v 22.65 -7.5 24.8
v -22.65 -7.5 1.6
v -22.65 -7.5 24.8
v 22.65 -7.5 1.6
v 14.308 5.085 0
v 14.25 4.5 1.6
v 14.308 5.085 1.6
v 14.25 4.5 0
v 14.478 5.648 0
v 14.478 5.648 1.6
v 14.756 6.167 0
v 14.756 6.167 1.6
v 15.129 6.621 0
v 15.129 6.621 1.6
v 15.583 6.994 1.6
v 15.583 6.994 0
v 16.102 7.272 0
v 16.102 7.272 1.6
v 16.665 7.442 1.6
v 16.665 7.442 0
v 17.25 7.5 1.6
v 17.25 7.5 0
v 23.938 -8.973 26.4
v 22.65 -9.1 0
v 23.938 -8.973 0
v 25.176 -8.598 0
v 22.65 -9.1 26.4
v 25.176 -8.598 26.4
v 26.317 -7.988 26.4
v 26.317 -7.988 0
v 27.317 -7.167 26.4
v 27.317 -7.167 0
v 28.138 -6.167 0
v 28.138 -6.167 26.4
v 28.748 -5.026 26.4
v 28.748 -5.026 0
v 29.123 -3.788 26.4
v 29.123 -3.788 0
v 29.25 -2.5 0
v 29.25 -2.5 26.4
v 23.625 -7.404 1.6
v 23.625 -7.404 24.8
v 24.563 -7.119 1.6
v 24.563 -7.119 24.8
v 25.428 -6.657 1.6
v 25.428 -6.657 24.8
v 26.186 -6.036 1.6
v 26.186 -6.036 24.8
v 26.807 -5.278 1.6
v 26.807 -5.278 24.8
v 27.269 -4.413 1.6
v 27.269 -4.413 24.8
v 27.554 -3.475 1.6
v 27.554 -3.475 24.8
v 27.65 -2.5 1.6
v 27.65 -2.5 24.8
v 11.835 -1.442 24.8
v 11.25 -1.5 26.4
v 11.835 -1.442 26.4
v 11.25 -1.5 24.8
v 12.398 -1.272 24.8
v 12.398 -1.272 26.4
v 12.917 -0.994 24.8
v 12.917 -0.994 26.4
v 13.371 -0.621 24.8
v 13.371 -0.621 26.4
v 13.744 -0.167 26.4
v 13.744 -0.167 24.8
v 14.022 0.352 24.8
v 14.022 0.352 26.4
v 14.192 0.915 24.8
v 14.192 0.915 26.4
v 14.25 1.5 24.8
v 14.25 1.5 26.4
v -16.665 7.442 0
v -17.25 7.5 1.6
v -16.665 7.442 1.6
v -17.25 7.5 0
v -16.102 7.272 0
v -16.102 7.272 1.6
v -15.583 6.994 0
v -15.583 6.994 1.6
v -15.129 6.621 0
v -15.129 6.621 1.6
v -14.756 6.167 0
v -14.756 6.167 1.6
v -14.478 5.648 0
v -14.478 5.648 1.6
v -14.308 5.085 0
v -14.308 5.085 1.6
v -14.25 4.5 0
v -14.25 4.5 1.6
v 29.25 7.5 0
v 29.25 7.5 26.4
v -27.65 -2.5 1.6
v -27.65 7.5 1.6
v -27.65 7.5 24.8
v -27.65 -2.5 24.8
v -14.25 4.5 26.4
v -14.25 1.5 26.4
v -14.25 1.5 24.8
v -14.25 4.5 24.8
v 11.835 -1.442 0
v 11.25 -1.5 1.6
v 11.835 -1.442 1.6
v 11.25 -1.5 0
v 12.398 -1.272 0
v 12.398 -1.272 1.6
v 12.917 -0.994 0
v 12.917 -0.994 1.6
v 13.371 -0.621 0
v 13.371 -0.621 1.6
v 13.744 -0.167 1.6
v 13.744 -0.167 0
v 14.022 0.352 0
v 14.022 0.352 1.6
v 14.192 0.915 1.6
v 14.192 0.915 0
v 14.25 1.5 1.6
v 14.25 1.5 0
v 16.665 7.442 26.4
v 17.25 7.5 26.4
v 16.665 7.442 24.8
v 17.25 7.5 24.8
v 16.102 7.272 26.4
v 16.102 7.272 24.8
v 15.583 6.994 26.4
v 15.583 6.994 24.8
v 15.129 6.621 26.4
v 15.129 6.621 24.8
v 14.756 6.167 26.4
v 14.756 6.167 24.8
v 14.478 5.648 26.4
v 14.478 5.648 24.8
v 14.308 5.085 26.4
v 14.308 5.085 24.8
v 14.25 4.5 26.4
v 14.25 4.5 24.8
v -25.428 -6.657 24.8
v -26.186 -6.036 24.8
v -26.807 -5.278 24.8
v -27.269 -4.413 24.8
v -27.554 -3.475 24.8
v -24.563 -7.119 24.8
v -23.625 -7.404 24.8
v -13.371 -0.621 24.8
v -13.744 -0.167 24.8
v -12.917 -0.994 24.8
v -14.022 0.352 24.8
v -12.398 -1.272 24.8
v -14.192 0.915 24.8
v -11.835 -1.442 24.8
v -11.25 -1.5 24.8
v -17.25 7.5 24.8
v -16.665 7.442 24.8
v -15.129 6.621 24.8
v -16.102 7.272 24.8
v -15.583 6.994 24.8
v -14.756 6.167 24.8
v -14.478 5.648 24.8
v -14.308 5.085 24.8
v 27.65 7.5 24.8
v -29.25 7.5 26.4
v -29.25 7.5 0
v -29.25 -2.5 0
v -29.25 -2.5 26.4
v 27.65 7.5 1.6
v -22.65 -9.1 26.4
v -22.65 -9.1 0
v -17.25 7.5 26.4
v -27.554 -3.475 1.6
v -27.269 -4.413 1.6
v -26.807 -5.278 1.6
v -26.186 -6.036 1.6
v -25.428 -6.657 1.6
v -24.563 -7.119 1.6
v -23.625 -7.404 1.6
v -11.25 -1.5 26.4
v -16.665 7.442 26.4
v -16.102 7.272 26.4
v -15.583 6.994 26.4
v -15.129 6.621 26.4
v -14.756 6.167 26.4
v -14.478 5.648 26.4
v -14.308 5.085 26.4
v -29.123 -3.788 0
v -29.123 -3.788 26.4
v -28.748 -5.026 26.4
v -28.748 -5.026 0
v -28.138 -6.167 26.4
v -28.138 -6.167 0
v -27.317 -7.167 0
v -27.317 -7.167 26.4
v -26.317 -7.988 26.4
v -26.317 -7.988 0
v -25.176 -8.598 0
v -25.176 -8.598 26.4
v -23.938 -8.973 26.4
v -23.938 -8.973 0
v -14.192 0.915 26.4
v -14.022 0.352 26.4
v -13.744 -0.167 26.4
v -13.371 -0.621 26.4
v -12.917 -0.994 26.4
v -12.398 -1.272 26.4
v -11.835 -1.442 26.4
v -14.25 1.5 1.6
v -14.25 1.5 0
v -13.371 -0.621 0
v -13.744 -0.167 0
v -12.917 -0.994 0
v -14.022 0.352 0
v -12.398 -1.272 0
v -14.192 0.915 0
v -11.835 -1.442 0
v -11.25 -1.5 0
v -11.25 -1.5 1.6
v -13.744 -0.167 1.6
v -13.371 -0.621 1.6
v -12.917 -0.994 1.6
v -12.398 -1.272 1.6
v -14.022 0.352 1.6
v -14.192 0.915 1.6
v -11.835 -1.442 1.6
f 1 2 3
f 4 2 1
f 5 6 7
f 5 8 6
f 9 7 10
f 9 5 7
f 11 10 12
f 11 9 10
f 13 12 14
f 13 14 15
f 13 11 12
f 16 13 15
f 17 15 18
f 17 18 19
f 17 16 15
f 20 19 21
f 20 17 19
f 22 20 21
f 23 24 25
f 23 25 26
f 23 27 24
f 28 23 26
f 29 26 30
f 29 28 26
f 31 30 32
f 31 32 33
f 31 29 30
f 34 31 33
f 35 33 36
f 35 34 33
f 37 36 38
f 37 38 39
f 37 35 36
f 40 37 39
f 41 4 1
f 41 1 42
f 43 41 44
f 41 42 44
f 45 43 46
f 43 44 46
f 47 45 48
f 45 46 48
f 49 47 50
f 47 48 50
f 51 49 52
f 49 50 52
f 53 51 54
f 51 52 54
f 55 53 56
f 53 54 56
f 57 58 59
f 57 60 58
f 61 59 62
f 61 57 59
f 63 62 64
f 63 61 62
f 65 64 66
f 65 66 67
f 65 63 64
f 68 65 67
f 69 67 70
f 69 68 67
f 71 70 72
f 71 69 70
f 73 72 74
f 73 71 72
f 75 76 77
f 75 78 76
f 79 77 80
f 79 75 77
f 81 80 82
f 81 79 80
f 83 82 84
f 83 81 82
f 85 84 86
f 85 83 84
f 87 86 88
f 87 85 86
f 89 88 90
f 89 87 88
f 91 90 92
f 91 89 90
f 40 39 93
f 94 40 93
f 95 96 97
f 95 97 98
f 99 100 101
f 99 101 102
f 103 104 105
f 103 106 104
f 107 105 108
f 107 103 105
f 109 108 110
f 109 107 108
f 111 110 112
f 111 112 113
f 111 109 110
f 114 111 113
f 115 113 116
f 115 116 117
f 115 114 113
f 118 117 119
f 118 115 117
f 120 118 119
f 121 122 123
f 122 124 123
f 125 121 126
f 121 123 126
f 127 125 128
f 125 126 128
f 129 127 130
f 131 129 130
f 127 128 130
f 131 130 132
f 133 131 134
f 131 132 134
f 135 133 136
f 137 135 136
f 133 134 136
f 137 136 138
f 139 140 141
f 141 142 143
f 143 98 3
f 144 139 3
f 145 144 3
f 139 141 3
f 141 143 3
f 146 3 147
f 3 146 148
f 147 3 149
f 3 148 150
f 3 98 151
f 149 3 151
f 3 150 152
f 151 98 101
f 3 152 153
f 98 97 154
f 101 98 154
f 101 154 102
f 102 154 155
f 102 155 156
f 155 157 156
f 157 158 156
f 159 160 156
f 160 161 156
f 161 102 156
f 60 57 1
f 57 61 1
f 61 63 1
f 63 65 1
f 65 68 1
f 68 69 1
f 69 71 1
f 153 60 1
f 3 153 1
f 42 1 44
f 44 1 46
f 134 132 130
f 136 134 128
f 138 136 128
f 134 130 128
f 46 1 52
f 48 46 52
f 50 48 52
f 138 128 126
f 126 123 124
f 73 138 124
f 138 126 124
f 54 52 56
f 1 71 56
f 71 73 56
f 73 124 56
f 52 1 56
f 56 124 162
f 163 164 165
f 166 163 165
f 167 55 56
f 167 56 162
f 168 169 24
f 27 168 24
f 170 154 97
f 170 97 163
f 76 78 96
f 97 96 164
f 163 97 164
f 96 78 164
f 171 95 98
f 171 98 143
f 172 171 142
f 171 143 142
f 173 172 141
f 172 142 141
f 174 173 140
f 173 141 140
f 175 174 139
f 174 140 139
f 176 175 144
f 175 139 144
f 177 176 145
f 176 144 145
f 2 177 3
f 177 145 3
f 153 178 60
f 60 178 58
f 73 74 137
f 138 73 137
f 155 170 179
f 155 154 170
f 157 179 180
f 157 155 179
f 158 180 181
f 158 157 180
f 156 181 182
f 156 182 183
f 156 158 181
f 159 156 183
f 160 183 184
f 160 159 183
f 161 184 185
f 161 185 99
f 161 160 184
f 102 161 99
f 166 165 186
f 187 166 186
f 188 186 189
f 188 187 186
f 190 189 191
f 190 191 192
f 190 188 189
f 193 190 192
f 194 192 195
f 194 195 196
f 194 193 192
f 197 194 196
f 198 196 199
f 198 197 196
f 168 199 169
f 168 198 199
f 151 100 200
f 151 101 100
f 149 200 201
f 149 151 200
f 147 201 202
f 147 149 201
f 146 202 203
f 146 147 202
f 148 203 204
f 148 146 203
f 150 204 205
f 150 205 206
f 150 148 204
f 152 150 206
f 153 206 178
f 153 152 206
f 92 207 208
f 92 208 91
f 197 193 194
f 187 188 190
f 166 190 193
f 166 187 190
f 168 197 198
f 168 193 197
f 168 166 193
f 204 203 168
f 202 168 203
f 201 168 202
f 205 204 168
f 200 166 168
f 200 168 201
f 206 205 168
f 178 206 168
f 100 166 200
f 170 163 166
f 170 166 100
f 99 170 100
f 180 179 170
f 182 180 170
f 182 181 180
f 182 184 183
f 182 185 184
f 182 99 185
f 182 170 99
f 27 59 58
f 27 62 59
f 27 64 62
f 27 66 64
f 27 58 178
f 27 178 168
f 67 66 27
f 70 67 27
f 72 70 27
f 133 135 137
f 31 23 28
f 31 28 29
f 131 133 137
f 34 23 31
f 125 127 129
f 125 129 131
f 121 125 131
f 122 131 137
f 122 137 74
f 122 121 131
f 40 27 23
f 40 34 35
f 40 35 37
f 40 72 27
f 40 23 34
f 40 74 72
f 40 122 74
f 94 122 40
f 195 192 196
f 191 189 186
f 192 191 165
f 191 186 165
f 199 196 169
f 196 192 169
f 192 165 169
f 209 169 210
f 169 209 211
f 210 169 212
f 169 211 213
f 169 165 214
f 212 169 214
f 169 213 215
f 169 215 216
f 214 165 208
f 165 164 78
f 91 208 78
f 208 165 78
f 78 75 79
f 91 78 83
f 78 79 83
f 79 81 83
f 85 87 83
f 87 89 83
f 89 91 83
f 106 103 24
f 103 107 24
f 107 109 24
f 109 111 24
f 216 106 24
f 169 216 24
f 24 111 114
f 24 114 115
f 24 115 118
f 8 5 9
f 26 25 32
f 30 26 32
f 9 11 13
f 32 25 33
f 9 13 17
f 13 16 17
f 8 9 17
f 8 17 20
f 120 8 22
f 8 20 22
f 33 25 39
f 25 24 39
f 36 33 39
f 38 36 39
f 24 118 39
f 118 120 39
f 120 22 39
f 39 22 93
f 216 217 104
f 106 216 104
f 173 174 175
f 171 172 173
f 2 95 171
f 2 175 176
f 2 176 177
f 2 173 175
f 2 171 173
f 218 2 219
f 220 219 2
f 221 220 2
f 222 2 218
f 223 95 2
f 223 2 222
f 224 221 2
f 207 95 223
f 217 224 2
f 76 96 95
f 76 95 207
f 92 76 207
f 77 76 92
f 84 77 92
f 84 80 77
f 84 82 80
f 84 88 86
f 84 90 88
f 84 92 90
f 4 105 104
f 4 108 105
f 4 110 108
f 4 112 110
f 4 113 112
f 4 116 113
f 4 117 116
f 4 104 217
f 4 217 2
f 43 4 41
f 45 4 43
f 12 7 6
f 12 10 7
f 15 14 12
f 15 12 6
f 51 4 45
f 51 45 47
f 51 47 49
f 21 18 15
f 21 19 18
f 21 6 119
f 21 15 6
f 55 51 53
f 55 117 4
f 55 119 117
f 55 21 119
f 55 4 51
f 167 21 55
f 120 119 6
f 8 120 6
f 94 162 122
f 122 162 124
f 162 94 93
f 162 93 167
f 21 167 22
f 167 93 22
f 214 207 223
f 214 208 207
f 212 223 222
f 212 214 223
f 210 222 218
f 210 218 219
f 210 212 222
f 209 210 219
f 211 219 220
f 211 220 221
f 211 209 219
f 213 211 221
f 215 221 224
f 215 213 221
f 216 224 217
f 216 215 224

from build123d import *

# Parameters (mm, degrees)
F1_DEPTH = 26.4
F2_R     = 6.6
F3_T     = -1.6
F4_W     = 28.5
F4_H     = 9
F5_DEPTH = 26.401
F6_R     = 3


with BuildPart() as f1:
    # F0 (on Top) → F1 (new body)
    with BuildSketch(Plane.XY):
        Polygon((29.25, 7.5), (27.65, 7.5), (-27.65, 7.5), (-29.25, 7.5), (-29.25, -9.1), (29.25, -9.1), align=None)
    extrude(amount=F1_DEPTH)

    # F2
    f2_edges = [f1.edges().sort_by_distance(p)[0] for p in [
        (29.25, -9.1, 13.2),
        (-29.25, -9.1, 13.2),
    ]]
    fillet(f2_edges, radius=F2_R)

    # F3
    f3_openings = [f1.faces().sort_by_distance(p)[0] for p in [
        (0, 7.5, 13.2),
    ]]
    offset(amount=F3_T, openings=f3_openings)

    # F4 (on face) → F5 (cut, through all)
    with BuildSketch(Plane.XY.offset(26.4)):
        with Locations((0, 3)):
            Rectangle(F4_W, F4_H)
    extrude(amount=-F5_DEPTH, mode=Mode.SUBTRACT)

    # F6
    f6_edges = [f1.edges().sort_by_distance(p)[0] for p in [
        (14.25, -1.5, 25.6),
        (14.25, 7.5, 25.6),
        (14.25, 7.5, 0.8),
        (14.25, -1.5, 0.8),
        (-14.25, 7.5, 25.6),
        (-14.25, 7.5, 0.8),
        (-14.25, -1.5, 0.8),
        (-14.25, -1.5, 25.6),
    ]]
    fillet(f6_edges, radius=F6_R)


solid = f1.part
